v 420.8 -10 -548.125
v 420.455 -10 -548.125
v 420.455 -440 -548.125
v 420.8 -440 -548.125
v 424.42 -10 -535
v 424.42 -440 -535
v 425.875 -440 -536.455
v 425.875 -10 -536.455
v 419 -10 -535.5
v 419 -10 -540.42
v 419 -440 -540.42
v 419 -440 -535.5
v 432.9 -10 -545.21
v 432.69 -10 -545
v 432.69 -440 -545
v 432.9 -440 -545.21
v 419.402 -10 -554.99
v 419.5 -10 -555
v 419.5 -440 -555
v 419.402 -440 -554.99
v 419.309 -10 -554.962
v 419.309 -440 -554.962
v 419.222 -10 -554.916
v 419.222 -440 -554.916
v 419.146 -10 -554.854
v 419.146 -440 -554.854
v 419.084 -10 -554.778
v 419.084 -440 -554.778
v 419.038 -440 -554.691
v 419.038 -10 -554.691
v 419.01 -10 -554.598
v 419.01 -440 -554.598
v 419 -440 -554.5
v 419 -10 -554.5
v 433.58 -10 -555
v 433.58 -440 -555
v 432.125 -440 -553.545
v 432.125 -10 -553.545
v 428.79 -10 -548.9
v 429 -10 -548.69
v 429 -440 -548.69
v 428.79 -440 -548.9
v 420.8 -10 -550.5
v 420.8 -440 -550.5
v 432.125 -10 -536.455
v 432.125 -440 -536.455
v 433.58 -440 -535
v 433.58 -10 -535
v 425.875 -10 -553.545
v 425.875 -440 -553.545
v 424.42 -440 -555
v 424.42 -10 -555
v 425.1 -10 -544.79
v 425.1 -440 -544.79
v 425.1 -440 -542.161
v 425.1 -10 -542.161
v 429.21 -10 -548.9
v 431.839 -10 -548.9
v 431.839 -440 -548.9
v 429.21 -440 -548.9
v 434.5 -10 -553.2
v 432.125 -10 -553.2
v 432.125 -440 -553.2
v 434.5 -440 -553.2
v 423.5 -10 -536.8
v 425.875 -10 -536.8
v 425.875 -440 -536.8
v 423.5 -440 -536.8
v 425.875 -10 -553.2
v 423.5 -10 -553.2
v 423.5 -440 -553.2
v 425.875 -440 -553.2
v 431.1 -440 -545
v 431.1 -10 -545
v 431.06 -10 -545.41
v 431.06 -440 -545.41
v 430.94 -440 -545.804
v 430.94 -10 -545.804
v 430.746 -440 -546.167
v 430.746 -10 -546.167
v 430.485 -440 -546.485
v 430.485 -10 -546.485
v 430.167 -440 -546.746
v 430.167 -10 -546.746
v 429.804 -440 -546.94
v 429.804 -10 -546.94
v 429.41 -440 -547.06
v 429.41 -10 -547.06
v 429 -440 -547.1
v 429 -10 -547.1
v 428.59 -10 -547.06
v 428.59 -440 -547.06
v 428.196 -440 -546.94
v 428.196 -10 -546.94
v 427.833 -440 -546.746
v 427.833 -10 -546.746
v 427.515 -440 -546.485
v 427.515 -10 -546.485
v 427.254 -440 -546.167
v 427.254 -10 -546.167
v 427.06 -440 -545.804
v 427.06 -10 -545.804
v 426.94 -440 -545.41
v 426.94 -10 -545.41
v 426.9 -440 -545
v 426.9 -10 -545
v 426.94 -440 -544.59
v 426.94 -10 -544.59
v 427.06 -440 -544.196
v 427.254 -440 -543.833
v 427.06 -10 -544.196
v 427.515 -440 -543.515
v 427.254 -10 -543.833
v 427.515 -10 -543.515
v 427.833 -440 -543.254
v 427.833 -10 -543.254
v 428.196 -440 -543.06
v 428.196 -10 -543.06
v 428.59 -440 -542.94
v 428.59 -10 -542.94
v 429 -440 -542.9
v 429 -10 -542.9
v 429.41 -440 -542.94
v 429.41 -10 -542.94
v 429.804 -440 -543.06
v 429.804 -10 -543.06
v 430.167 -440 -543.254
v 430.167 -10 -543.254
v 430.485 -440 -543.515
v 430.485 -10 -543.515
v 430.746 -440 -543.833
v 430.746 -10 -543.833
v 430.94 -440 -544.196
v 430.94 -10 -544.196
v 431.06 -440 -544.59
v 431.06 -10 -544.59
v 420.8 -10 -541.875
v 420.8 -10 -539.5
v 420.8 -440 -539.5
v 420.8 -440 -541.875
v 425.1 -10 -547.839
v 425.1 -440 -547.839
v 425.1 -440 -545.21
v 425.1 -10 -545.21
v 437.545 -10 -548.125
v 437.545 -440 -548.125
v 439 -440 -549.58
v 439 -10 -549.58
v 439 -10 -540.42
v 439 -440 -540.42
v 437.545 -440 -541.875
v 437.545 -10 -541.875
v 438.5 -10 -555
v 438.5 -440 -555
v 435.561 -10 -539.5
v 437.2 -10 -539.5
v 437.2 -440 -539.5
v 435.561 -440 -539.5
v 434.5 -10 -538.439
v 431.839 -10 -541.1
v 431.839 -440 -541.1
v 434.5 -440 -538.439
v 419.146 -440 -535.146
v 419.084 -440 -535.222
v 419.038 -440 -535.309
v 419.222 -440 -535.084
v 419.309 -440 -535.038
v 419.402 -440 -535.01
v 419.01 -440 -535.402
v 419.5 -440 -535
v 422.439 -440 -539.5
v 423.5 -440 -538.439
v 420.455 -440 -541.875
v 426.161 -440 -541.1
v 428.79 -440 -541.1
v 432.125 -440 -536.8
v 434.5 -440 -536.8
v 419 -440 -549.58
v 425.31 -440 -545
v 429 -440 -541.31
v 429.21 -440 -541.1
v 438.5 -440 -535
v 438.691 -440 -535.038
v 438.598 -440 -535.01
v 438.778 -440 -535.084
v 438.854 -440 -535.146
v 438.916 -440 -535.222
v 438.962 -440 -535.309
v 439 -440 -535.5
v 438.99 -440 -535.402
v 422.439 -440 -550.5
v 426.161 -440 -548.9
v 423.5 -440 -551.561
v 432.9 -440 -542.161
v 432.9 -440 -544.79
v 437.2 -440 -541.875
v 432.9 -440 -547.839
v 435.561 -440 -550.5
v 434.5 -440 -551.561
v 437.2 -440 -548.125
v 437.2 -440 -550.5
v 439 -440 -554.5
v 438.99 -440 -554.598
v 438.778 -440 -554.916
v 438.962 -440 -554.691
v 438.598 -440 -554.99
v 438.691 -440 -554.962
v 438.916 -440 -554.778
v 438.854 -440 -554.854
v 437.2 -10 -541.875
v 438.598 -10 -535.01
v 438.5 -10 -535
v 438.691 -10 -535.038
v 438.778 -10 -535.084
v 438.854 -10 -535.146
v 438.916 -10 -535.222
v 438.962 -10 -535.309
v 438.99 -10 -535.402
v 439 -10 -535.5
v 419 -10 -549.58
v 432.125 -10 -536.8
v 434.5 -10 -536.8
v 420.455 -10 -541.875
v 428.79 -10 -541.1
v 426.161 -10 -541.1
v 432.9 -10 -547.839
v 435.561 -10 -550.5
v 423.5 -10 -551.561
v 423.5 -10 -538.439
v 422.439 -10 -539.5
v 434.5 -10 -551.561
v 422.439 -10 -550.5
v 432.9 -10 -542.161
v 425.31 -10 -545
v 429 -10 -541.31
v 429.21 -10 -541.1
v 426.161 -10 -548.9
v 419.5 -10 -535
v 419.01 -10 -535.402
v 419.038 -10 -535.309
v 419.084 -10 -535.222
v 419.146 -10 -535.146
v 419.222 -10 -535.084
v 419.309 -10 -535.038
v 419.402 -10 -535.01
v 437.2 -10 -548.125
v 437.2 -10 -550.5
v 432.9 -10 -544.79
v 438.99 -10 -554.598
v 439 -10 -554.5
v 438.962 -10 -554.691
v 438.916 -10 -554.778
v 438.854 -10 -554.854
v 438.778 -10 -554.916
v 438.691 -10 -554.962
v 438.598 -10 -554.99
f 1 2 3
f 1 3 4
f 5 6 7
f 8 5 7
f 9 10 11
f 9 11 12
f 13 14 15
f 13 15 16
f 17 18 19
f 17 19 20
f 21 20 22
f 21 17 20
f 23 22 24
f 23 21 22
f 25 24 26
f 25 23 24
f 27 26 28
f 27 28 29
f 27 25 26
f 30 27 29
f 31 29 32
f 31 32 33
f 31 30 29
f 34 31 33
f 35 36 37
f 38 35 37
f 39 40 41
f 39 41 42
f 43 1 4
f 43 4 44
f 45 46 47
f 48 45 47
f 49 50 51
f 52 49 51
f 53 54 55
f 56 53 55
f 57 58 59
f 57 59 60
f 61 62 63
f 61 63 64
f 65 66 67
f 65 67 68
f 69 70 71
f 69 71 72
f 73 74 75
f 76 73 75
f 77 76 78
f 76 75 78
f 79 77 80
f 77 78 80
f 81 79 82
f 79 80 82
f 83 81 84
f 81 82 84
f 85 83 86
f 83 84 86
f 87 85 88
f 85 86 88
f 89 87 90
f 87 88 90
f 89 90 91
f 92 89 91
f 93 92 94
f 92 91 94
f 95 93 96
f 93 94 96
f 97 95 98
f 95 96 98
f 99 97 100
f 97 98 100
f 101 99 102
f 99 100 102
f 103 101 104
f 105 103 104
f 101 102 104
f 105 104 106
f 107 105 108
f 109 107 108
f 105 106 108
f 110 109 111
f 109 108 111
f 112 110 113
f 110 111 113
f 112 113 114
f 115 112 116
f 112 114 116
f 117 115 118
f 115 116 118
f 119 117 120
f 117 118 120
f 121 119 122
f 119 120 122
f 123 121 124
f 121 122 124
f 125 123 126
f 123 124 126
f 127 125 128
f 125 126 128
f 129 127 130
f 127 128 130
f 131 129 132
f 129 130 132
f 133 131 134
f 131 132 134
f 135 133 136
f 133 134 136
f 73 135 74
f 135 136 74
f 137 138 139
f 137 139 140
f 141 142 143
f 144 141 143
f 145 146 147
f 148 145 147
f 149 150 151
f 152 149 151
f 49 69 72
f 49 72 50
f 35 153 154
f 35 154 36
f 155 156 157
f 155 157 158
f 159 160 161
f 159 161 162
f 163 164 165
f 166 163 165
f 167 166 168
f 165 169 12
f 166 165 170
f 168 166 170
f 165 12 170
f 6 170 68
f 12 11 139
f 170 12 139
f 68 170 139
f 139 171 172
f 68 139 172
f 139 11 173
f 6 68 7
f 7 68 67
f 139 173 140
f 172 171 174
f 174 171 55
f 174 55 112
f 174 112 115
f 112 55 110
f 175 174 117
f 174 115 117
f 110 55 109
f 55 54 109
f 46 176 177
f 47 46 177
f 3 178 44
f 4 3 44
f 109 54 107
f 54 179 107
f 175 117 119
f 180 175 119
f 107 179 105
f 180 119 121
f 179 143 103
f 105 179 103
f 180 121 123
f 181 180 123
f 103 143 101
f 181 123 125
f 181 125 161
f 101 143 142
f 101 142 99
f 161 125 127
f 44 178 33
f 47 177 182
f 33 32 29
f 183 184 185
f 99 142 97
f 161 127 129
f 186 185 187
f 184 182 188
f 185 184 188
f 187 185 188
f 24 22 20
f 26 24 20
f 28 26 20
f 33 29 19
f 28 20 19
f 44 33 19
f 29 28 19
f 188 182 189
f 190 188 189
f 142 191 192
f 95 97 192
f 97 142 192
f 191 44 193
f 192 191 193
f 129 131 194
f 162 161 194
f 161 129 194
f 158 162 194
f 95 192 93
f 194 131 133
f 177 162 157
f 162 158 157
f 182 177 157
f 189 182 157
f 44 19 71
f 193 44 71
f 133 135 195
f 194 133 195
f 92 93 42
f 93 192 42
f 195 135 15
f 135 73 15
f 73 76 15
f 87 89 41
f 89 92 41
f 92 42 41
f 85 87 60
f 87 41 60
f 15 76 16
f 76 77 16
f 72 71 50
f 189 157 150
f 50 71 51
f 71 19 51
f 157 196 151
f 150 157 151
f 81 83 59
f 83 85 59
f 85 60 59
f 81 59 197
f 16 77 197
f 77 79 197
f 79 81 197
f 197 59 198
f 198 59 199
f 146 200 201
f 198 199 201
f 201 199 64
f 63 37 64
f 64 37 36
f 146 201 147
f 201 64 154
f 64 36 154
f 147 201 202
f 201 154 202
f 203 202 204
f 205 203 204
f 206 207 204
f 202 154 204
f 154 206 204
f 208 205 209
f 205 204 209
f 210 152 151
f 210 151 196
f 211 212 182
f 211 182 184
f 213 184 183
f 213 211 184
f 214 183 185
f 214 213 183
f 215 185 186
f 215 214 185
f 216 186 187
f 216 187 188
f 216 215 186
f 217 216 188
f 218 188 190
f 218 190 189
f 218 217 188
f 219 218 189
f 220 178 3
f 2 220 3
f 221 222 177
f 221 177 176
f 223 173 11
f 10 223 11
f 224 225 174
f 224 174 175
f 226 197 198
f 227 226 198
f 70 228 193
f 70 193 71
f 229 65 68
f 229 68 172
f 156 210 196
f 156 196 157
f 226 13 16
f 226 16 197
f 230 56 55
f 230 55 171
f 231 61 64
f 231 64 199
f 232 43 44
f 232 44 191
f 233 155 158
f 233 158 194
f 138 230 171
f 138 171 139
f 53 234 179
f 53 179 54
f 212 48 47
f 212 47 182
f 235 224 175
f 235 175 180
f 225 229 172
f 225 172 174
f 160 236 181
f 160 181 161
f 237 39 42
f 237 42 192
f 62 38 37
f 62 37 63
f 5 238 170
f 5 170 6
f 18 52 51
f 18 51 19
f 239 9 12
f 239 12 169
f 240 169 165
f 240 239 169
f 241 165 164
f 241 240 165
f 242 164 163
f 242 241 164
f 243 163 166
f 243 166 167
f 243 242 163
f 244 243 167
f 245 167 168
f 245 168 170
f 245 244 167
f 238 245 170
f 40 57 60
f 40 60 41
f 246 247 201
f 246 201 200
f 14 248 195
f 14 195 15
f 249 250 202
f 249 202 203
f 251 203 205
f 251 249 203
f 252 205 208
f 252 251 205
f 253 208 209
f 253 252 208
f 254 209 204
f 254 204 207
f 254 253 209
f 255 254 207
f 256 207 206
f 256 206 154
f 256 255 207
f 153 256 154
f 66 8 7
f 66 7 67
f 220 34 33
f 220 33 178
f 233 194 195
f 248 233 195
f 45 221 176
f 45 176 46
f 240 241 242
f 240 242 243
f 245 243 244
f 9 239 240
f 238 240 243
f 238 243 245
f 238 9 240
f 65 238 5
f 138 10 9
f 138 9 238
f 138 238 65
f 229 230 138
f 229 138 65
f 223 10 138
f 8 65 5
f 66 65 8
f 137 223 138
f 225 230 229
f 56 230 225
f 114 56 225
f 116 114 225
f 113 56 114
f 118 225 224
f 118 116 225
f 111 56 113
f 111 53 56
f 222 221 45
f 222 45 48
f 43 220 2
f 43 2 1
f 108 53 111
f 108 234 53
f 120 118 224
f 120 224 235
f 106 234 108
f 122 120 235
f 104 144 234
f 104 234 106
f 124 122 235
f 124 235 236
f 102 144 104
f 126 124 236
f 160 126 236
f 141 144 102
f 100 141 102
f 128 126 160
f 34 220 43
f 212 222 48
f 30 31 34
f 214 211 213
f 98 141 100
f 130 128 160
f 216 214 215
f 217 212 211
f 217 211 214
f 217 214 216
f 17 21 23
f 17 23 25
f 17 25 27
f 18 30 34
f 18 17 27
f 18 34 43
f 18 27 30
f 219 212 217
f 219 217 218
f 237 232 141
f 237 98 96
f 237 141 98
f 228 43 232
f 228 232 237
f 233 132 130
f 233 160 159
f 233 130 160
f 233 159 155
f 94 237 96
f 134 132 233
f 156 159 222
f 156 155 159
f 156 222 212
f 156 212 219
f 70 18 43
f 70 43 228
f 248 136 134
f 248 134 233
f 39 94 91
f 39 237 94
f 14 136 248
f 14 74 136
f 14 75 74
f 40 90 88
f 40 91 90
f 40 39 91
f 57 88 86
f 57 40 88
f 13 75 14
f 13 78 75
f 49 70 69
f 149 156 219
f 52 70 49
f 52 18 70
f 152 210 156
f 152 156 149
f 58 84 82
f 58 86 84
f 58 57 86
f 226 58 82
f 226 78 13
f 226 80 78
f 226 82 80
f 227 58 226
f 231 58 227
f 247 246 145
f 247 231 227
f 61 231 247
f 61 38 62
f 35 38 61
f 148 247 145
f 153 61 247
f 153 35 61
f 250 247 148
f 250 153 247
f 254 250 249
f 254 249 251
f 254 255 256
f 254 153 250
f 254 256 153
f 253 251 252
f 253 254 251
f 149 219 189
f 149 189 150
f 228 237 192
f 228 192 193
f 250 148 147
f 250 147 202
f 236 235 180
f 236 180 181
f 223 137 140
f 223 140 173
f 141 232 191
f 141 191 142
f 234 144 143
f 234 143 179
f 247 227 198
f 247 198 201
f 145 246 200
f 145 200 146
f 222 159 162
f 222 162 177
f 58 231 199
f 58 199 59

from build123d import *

# Parameters (mm, degrees)
SKETCH1_R           = 2.1
BOSS_EXTRUDE1_DEPTH = 430


with BuildPart() as part:
    # Sketch1 → Boss-Extrude1 (new body)
    with BuildSketch(Plane(origin=(0, -10, 0), x_dir=(1, 0, 0), z_dir=(0, 1, 0))):
        with BuildLine():
            Line((419, 554.5), (419, 549.58))
            Line((419, 549.58), (420.455, 548.125))
            Line((420.455, 548.125), (420.8, 548.125))
            Line((420.8, 548.125), (420.8, 550.5))
            Line((420.8, 550.5), (422.439339828, 550.5))
            Line((422.439339828, 550.5), (425.1, 547.839339828))
            Line((425.1, 547.839339828), (425.1, 545.21))
            Line((425.1, 545.21), (425.31, 545))
            Line((425.31, 545), (425.1, 544.79))
            Line((425.1, 544.79), (425.1, 542.160660172))
            Line((425.1, 542.160660172), (422.439339828, 539.5))
            Line((422.439339828, 539.5), (420.8, 539.5))
            Line((420.8, 539.5), (420.8, 541.875))
            Line((420.8, 541.875), (420.455, 541.875))
            Line((420.455, 541.875), (419, 540.42))
            Line((419, 540.42), (419, 535.5))
            ThreePointArc((419, 535.5), (419.146446609, 535.146446609), (419.5, 535))
            Line((419.5, 535), (424.42, 535))
            Line((424.42, 535), (425.875, 536.455))
            Line((425.875, 536.455), (425.875, 536.8))
            Line((425.875, 536.8), (423.5, 536.8))
            Line((423.5, 536.8), (423.5, 538.439339828))
            Line((423.5, 538.439339828), (426.160660172, 541.1))
            Line((426.160660172, 541.1), (428.79, 541.1))
            Line((428.79, 541.1), (429, 541.31))
            Line((429, 541.31), (429.21, 541.1))
            Line((429.21, 541.1), (431.839339828, 541.1))
            Line((431.839339828, 541.1), (434.5, 538.439339828))
            Line((434.5, 538.439339828), (434.5, 536.8))
            Line((434.5, 536.8), (432.125, 536.8))
            Line((432.125, 536.8), (432.125, 536.455))
            Line((432.125, 536.455), (433.58, 535))
            Line((433.58, 535), (438.5, 535))
            ThreePointArc((438.5, 535), (438.853553391, 535.146446609), (439, 535.5))
            Line((439, 535.5), (439, 540.42))
            Line((439, 540.42), (437.545, 541.875))
            Line((437.545, 541.875), (437.2, 541.875))
            Line((437.2, 541.875), (437.2, 539.5))
            Line((437.2, 539.5), (435.560660172, 539.5))
            Line((435.560660172, 539.5), (432.9, 542.160660172))
            Line((432.9, 542.160660172), (432.9, 544.79))
            Line((432.9, 544.79), (432.69, 545))
            Line((432.69, 545), (432.9, 545.21))
            Line((432.9, 545.21), (432.9, 547.839339829))
            Line((432.9, 547.839339829), (435.560660171, 550.5))
            Line((435.560660171, 550.5), (437.2, 550.5))
            Line((437.2, 550.5), (437.2, 548.125))
            Line((437.2, 548.125), (437.545, 548.125))
            Line((437.545, 548.125), (439, 549.58))
            Line((439, 549.58), (439, 554.5))
            ThreePointArc((439, 554.5), (438.853553391, 554.853553391), (438.5, 555))
            Line((438.5, 555), (433.58, 555))
            Line((433.58, 555), (432.125, 553.545))
            Line((432.125, 553.545), (432.125, 553.2))
            Line((432.125, 553.2), (434.5, 553.2))
            Line((434.5, 553.2), (434.5, 551.560660172))
            Line((434.5, 551.560660172), (431.839339828, 548.9))
            Line((431.839339828, 548.9), (429.21, 548.9))
            Line((429.21, 548.9), (429, 548.69))
            Line((429, 548.69), (428.79, 548.9))
            Line((428.79, 548.9), (426.160660172, 548.9))
            Line((426.160660172, 548.9), (423.5, 551.560660172))
            Line((423.5, 551.560660172), (423.5, 553.2))
            Line((423.5, 553.2), (425.875, 553.2))
            Line((425.875, 553.2), (425.875, 553.545))
            Line((425.875, 553.545), (424.42, 555))
            Line((424.42, 555), (419.5, 555))
            ThreePointArc((419.5, 555), (419.146446609, 554.853553391), (419, 554.5))
        make_face()
        with Locations((429, 545)):
            Circle(SKETCH1_R, mode=Mode.SUBTRACT)
    extrude(amount=-BOSS_EXTRUDE1_DEPTH)


solid = part.part
